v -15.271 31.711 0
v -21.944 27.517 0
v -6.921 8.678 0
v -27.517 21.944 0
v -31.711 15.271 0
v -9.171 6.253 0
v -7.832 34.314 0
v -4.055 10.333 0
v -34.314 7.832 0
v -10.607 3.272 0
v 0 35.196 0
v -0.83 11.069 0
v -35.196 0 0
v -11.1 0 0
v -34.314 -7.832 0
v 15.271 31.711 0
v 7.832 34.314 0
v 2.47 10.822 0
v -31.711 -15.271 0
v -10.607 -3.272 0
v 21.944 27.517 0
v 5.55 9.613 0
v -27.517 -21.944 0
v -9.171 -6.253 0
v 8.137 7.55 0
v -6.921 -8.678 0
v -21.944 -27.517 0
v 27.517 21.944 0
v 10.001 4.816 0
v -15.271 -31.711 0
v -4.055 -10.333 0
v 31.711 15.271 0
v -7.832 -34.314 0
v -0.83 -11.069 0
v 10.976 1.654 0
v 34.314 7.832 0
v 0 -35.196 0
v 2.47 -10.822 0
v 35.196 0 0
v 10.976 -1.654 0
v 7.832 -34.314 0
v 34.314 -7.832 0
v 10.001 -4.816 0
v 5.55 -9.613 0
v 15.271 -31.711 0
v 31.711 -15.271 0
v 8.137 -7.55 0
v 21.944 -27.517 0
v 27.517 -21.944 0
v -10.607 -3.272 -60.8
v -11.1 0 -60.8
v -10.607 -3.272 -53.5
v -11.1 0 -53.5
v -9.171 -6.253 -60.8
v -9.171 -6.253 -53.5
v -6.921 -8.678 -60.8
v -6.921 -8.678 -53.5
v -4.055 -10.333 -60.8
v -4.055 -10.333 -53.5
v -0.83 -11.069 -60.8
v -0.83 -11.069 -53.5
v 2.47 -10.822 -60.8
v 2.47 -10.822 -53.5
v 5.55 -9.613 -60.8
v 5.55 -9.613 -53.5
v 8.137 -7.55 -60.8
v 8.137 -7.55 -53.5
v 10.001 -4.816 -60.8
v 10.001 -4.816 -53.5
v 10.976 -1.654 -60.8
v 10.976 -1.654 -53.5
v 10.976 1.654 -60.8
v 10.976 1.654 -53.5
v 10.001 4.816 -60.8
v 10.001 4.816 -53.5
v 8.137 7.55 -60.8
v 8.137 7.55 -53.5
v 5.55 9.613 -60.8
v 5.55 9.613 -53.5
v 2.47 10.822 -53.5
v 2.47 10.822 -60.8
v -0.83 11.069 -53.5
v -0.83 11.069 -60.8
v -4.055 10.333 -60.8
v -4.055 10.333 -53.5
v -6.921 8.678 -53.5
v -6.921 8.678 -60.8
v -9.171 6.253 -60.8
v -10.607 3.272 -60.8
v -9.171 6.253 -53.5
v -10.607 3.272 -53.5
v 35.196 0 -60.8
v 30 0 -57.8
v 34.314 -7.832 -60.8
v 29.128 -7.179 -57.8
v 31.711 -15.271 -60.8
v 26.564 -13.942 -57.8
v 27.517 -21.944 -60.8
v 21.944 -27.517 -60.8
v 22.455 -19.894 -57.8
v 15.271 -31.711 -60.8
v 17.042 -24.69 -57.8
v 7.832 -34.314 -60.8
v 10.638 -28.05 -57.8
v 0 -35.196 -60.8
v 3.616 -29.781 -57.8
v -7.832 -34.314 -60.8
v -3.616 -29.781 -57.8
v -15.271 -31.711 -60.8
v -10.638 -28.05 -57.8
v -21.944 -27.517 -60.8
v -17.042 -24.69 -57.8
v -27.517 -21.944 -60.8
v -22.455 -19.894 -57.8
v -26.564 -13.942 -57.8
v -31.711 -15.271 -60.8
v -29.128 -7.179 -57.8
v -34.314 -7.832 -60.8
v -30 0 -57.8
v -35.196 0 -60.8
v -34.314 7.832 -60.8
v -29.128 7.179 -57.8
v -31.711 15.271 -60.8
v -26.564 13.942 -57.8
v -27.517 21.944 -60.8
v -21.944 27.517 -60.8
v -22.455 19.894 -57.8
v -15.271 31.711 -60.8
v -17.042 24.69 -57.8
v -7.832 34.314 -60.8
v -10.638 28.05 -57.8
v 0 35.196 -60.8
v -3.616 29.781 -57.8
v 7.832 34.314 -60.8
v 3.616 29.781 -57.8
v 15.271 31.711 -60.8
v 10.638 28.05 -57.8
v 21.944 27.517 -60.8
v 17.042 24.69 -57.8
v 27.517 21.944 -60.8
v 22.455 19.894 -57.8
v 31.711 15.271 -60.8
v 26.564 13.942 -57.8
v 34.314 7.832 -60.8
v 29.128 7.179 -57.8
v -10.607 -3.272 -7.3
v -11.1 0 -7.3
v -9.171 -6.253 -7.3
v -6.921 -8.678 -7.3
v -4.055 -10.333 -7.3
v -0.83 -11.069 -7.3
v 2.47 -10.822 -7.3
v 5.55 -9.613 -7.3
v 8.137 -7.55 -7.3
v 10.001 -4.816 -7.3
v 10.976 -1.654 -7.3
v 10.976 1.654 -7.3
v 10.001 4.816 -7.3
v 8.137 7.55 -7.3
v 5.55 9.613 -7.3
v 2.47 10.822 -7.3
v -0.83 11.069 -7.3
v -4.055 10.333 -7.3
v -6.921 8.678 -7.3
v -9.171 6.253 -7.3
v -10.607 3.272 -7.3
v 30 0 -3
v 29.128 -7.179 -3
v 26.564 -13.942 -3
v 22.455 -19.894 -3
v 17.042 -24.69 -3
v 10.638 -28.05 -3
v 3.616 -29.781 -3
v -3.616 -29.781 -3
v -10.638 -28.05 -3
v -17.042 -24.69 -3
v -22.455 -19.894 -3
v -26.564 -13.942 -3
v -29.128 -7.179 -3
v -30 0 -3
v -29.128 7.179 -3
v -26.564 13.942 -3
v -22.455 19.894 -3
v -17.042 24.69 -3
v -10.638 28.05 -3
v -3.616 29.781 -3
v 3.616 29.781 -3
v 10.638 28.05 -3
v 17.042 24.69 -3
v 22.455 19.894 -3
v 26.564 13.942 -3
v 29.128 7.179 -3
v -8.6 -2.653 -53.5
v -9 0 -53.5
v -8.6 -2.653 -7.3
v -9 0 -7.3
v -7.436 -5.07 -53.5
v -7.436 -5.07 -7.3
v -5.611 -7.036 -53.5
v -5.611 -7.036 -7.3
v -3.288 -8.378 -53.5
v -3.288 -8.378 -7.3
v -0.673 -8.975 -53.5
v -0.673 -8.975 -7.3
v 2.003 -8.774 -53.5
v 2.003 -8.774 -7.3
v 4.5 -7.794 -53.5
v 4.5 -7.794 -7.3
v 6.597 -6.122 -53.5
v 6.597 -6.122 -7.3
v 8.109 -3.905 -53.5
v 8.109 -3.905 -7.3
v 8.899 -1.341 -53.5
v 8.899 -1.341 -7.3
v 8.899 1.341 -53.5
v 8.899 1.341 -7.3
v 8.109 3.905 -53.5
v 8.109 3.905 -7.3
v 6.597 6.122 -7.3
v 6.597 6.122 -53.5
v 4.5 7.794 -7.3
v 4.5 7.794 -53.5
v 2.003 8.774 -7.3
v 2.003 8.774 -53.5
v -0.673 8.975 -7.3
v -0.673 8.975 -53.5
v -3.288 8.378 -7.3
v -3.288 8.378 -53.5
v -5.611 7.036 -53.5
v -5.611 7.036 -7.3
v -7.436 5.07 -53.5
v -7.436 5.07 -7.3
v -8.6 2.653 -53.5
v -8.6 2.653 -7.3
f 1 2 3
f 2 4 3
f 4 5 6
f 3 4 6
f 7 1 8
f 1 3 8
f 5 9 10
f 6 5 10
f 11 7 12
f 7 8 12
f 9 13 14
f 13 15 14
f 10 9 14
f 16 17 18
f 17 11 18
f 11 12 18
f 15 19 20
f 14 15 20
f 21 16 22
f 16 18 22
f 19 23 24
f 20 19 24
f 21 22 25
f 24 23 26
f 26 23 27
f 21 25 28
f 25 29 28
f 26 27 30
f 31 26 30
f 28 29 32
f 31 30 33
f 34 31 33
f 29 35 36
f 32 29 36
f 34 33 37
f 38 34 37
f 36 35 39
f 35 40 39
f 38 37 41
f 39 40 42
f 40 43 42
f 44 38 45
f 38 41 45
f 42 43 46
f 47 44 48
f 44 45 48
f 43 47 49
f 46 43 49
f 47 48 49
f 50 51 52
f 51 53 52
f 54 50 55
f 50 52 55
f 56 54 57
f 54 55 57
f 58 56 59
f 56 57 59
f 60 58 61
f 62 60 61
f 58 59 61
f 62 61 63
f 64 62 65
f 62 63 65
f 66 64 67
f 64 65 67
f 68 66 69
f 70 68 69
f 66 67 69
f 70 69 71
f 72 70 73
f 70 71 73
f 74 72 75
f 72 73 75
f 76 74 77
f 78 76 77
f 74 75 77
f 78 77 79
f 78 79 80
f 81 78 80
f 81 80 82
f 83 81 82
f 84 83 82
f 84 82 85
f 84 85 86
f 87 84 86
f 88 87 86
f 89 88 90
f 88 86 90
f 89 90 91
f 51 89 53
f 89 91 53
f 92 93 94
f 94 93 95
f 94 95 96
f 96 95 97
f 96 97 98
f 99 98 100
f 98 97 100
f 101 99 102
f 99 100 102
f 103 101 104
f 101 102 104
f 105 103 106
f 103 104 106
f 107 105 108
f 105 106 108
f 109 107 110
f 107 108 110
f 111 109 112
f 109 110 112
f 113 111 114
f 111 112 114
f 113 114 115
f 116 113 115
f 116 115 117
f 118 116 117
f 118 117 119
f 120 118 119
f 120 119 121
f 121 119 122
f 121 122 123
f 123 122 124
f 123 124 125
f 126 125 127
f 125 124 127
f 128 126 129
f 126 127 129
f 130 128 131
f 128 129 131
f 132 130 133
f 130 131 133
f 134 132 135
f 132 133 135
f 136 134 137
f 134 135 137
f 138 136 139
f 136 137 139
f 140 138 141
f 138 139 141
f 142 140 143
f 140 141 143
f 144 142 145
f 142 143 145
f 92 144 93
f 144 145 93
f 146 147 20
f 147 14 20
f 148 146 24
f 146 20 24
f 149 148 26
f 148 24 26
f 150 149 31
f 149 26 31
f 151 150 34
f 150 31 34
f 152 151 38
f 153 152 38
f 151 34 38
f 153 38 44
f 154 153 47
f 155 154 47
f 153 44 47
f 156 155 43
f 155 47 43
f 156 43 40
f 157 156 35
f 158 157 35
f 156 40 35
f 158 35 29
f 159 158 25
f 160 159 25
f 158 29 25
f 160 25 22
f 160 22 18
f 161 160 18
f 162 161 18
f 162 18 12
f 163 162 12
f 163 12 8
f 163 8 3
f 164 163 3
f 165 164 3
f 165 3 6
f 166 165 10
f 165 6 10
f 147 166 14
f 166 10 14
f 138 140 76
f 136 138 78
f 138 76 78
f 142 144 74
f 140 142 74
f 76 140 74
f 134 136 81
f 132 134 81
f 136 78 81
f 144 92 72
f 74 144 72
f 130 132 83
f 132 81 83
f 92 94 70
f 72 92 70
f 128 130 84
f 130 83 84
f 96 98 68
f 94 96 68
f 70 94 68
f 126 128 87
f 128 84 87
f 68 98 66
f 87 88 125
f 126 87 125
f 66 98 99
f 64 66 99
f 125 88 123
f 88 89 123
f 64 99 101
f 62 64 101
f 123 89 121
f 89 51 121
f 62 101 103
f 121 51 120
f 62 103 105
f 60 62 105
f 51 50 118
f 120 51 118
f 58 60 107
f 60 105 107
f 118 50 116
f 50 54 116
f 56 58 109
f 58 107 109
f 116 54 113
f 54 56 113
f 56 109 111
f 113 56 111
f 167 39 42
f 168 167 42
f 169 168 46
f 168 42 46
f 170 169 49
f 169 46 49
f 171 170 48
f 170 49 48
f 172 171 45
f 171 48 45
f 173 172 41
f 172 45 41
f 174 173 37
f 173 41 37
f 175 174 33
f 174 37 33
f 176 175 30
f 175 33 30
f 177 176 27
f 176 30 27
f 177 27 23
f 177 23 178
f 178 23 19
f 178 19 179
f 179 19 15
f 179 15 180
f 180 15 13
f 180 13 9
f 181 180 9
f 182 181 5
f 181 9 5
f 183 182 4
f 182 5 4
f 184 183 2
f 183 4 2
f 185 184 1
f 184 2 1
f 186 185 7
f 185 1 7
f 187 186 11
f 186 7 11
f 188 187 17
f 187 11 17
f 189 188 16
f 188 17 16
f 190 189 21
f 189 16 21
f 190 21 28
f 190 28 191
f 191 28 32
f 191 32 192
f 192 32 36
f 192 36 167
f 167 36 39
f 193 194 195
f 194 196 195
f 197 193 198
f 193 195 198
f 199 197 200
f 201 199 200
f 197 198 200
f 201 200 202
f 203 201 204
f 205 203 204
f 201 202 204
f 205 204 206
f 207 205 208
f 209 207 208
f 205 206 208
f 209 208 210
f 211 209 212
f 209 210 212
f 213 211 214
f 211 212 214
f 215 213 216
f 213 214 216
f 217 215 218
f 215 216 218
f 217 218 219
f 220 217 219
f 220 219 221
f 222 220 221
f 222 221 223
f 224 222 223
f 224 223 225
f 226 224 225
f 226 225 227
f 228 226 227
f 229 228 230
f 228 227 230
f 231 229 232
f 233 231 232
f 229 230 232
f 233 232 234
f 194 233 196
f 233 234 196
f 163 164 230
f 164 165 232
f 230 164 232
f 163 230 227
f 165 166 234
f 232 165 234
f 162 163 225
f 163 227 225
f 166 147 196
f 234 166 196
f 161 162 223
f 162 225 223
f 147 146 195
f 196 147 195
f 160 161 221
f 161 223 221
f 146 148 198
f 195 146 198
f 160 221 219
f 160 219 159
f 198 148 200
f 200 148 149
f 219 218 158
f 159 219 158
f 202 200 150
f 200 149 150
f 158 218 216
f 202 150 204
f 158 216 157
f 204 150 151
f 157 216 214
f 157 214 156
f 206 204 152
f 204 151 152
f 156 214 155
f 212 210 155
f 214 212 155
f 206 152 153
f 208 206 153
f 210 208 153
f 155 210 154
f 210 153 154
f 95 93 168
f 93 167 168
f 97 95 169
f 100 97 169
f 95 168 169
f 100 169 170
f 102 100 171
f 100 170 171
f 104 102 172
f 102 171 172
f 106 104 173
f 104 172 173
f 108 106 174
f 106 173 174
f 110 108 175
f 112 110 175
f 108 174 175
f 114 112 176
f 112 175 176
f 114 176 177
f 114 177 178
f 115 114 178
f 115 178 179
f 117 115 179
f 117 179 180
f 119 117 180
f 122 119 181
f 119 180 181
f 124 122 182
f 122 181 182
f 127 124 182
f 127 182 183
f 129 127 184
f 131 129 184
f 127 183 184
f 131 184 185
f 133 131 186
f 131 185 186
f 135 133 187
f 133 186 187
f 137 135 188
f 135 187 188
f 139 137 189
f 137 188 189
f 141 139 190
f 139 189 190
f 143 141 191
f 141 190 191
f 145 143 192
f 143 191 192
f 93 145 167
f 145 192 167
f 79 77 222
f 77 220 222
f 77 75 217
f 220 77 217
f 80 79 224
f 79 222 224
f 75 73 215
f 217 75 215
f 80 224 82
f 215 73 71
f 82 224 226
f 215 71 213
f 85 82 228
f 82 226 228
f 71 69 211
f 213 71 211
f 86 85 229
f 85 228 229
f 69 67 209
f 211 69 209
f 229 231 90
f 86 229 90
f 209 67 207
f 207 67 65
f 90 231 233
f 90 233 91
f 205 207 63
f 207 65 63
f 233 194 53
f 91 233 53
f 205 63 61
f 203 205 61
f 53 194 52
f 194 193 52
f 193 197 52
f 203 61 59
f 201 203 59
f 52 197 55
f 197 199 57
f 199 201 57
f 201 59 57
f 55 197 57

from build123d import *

# Parameters (mm, degrees)
CHAMFER1_SIZE   = 3.464101615
CHAMFER1_SIZE_2 = 6


with BuildPart() as part:
    # Sketch1 → Revolve1 (revolve)
    with BuildSketch(Plane(origin=(0, 0, 0), x_dir=(1, 0, 0), z_dir=(0, 1, 0)), mode=Mode.PRIVATE) as revolve1_sk:
        Polygon((0, 0), (0, 60.8), (-36, 60.8), (-36, 57.8), (-30, 57.8), (-30, 3), (-36, 3), (-36, 0), align=None)
    revolve(revolve1_sk.sketch.rotate(Axis((0, 0, 0), (0, 0, -1)), 180), axis=Axis((0, 0, 0), (0, 0, -1)))

    # Sketch7 → Cut-Revolve1 (revolve, cut)
    with BuildSketch(Plane(origin=(0, 0, 0), x_dir=(1, 0, 0), z_dir=(0, 1, 0))):
        Polygon((0, 60.8), (-11.1, 60.8), (-11.1, 53.5), (-9, 53.5), (-9, 7.3), (-11.1, 7.3), (-11.1, 0), (0, 0), align=None)
    revolve(axis=Axis((0, 0, -60.8), (0, 0, 1)), mode=Mode.SUBTRACT)

    # Chamfer1
    # the kernel refuses this chamfer: 6, 3.464101615 mm, written as the material it takes off along each edge
    with BuildSketch(Plane(origin=(0, 0, -57.8), x_dir=(1, 0, 0), z_dir=(0, 1, 0))) as chamfer1_piece_1_section:
        Polygon((36, CHAMFER1_SIZE), (36 - CHAMFER1_SIZE_2, 0), (36, 0), align=None)
    chamfer1_piece_1 = revolve(axis=Axis((0, 0, -57.8), (0, 0, -1)), mode=Mode.PRIVATE)
    chamfer1_piece_1 = chamfer1_piece_1 - Plane(origin=(0, 0, -57.8), x_dir=(1, 0, 0), z_dir=(0, 0, 1)) * Cylinder(30, 144, mode=Mode.PRIVATE)
    add(chamfer1_piece_1, mode=Mode.SUBTRACT)
    with BuildSketch(Plane(origin=(0, 0, -3), x_dir=(1, 0, 0), z_dir=(0, 1, 0))) as chamfer1_piece_2_section:
        Polygon((36 - CHAMFER1_SIZE_2, 0), (36, -CHAMFER1_SIZE), (36, 0), align=None)
    chamfer1_piece_2 = revolve(axis=Axis((0, 0, -3), (0, 0, -1)), mode=Mode.PRIVATE)
    chamfer1_piece_2 = chamfer1_piece_2 - Plane(origin=(0, 0, -3), x_dir=(1, 0, 0), z_dir=(0, 0, 1)) * Cylinder(30, 144, mode=Mode.PRIVATE)
    add(chamfer1_piece_2, mode=Mode.SUBTRACT)


solid = part.part
